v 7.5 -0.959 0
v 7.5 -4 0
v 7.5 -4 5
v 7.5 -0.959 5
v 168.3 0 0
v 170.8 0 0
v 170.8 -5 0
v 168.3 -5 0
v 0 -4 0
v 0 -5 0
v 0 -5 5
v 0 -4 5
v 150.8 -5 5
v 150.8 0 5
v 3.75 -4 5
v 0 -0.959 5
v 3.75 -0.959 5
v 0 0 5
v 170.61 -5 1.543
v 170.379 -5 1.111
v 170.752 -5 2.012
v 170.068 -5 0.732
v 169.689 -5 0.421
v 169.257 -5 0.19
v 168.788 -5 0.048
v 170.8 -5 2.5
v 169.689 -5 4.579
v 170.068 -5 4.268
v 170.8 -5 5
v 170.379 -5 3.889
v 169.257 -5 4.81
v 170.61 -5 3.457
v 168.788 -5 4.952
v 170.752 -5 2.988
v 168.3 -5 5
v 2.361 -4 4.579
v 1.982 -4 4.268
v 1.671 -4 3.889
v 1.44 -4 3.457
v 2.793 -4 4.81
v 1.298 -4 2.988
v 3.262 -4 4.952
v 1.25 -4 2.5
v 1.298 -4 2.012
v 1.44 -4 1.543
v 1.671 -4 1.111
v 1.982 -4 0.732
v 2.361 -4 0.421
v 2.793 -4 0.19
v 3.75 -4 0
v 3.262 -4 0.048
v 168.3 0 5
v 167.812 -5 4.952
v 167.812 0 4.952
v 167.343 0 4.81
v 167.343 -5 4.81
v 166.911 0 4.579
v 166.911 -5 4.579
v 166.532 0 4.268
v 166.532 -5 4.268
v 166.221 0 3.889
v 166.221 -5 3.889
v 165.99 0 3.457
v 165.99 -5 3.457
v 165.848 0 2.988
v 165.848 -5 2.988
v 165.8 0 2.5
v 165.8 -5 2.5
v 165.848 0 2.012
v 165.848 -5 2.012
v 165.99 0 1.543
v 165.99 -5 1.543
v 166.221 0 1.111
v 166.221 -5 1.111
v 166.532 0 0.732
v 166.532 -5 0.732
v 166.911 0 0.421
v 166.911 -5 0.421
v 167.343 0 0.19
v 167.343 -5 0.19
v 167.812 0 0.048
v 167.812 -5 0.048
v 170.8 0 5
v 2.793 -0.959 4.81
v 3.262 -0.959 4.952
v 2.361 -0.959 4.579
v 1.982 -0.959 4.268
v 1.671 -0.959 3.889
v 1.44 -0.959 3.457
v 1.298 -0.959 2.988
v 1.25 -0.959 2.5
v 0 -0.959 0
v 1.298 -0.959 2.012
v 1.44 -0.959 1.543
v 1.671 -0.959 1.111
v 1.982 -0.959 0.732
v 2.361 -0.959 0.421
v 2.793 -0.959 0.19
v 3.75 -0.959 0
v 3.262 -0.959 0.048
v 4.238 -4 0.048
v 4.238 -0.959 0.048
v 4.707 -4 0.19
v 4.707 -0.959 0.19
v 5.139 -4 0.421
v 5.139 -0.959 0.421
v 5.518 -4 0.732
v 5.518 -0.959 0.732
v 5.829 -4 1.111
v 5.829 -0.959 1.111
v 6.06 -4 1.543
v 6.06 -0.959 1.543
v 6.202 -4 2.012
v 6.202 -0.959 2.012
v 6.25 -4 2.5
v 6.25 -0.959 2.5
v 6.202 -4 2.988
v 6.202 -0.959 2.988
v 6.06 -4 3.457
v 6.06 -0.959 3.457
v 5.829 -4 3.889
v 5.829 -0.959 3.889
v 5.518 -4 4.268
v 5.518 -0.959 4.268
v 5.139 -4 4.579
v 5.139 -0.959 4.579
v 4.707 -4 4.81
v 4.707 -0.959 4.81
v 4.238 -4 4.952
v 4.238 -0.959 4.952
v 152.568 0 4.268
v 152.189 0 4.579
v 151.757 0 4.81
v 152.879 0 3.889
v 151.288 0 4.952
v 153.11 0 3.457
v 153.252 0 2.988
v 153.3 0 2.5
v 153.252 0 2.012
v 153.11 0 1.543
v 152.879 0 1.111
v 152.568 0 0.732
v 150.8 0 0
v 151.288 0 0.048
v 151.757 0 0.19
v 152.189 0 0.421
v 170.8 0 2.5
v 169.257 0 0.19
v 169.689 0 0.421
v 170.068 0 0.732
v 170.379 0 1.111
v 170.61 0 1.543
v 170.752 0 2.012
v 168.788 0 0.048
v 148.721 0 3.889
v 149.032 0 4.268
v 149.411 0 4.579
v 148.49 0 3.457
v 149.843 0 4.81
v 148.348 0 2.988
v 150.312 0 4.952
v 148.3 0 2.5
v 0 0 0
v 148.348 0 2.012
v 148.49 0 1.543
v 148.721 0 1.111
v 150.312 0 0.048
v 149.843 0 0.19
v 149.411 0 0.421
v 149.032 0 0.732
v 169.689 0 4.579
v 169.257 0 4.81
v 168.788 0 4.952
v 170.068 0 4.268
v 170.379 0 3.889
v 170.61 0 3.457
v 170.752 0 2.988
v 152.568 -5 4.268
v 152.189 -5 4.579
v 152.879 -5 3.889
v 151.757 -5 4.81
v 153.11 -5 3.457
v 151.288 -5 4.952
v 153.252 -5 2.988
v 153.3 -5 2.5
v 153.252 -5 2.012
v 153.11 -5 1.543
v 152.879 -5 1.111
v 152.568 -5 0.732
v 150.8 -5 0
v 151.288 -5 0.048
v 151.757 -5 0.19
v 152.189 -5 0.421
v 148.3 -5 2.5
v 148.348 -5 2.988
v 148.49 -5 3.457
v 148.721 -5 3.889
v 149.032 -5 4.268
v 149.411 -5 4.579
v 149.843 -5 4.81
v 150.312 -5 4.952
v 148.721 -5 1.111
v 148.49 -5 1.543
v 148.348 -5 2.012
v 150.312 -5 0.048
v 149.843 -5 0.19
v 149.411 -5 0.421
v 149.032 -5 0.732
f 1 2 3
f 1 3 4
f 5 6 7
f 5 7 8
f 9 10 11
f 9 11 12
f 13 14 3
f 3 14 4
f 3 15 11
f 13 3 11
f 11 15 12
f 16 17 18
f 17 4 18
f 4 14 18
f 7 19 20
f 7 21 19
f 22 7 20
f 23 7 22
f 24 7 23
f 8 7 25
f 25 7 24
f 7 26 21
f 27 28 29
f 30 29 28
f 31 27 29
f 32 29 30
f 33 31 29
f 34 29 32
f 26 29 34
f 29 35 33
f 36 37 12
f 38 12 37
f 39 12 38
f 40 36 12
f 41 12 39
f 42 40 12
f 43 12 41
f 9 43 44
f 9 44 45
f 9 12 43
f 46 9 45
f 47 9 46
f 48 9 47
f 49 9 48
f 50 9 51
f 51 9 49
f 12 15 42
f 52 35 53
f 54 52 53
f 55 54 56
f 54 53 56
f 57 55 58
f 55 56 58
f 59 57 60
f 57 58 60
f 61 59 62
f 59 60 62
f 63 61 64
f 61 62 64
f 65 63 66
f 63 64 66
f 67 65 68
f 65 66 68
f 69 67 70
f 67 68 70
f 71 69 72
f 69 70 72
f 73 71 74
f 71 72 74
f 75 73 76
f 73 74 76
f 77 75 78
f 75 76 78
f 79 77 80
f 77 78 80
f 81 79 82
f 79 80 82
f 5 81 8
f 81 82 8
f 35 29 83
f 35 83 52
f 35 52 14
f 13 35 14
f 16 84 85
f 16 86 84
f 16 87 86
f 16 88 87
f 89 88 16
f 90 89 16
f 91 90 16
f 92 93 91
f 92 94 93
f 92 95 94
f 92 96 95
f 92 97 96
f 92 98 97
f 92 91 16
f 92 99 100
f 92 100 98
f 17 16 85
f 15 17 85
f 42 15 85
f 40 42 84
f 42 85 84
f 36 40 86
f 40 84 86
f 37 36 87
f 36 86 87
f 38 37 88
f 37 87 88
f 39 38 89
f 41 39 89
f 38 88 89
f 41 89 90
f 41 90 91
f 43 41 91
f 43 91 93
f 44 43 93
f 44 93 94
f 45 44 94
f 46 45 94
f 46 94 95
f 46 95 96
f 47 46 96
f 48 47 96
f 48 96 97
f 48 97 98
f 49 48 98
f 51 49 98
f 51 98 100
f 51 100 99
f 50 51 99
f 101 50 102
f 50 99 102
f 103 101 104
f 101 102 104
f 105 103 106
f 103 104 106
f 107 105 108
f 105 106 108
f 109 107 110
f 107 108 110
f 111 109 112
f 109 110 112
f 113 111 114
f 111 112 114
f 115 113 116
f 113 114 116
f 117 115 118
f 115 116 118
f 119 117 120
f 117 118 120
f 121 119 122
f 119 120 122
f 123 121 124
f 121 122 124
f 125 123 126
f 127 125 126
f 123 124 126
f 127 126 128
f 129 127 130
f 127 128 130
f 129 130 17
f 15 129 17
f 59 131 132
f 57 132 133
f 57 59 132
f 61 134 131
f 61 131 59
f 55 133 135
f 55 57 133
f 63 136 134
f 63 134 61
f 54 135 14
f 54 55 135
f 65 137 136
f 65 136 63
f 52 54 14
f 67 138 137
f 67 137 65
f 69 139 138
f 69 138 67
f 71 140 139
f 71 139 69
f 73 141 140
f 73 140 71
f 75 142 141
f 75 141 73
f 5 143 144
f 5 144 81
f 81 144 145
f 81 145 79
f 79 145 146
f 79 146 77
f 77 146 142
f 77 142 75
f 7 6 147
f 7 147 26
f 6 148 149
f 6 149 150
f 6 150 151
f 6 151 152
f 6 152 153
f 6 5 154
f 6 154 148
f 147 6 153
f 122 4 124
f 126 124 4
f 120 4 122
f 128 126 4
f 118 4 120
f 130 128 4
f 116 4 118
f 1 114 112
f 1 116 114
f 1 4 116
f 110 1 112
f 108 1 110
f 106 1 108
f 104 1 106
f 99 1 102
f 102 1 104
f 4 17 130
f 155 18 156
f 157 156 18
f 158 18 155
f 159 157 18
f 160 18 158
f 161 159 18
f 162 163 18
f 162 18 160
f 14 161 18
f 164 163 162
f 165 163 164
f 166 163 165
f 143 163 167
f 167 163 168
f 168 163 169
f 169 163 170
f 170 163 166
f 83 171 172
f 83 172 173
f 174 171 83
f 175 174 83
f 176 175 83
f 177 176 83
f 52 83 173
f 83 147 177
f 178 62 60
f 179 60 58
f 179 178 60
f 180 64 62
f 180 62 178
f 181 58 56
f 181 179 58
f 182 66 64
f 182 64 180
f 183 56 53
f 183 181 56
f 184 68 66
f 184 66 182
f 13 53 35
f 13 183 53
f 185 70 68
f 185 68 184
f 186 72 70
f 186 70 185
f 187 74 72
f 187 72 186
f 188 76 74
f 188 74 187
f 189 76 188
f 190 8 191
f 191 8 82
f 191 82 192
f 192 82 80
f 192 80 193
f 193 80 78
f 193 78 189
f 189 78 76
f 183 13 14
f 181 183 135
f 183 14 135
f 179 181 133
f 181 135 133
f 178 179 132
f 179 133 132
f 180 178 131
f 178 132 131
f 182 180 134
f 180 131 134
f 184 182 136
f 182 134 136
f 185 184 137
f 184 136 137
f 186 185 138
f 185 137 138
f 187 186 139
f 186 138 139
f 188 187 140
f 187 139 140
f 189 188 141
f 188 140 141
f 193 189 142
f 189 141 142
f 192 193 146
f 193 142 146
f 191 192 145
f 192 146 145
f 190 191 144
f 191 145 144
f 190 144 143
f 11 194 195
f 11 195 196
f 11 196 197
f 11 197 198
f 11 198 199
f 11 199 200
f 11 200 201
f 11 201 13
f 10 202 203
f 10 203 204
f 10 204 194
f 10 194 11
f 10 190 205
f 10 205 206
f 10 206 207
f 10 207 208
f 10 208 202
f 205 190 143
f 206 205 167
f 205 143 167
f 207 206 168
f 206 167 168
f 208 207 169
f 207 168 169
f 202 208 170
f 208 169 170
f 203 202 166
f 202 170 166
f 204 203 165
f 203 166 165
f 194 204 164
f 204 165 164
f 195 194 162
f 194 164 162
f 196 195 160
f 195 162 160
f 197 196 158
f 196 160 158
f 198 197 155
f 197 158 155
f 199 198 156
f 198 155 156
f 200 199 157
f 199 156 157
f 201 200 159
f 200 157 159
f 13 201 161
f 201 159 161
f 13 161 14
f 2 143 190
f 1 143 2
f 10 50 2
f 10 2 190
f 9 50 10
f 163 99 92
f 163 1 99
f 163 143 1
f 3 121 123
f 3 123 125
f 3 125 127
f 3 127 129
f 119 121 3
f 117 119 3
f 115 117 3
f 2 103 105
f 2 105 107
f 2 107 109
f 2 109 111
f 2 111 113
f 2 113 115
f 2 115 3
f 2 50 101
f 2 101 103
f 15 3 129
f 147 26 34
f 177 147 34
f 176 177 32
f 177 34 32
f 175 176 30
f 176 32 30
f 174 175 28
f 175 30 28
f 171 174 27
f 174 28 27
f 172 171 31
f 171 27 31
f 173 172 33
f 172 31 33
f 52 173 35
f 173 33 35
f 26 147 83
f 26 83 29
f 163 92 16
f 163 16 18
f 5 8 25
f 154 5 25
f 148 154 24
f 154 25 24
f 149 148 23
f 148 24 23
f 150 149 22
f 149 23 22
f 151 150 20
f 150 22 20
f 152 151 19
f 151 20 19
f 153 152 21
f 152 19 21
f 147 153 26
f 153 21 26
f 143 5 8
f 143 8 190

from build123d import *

# Parameters (mm, degrees)
BOSS_EXTRUDE1_DEPTH = 5
SKETCH8_R           = 2.5
BOSS_EXTRUDE4_DEPTH = 3.041317676
SKETCH9_R           = 2.5
CUT_EXTRUDE1_DEPTH  = 10
SKETCH10_R          = 2.5
CUT_EXTRUDE3_DEPTH  = 10


with BuildPart() as part:
    # Sketch1 → Boss-Extrude1 (new body)
    with BuildSketch(Plane.XY):
        Polygon((0, 0), (170.8, 0), (170.8, -5), (0, -5), (0, -4), (7.5, -4), (7.5, -0.958682324), (0, -0.958682324), align=None)
    extrude(amount=BOSS_EXTRUDE1_DEPTH)

    # Sketch8 → Boss-Extrude4 (add)
    with BuildSketch(Plane.XZ.offset(0.958682324)):
        with Locations(Location((3.75, 2.5, 0), (0, 0, 90))):
            Circle(SKETCH8_R)
    extrude(amount=BOSS_EXTRUDE4_DEPTH)

    # Sketch9 → Cut-Extrude1 (cut)
    with BuildSketch(Plane.XZ.offset(5)):
        with Locations((168.3, 2.5)):
            Circle(SKETCH9_R)
    extrude(amount=-CUT_EXTRUDE1_DEPTH, mode=Mode.SUBTRACT)


with BuildPart() as cut_extrude1_piece_1:
    # of the separate pieces the step leaves, piece 1, a body of its own (cut_extrude1_pieces)
    add(part.part.solids().sort_by_distance((0, 0, 0))[0])

    # Sketch10 → Cut-Extrude3 (cut)
    with BuildSketch(Plane(origin=(0, 0, 0), x_dir=(1, 0, 0), z_dir=(0, 1, 0))):
        with Locations((150.8, -2.5)):
            Circle(SKETCH10_R)
    extrude(amount=-CUT_EXTRUDE3_DEPTH, mode=Mode.SUBTRACT)


with BuildPart() as cut_extrude1_piece_2:
    # of the separate pieces the step leaves, piece 2, a body of its own (cut_extrude1_pieces)
    add(part.part.solids().sort_by_distance((170.8, -5, 0))[0])


with BuildPart() as cut_extrude1_piece_3:
    # of the separate pieces the step leaves, piece 3, a body of its own (cut_extrude1_pieces)
    add(part.part.solids().sort_by_distance((170.8, 0, 5))[0])


with BuildPart() as cut_extrude3_piece_1:
    # of the separate pieces the step leaves, piece 1, a body of its own (cut_extrude3_pieces)
    add(cut_extrude1_piece_1.part.solids().sort_by_distance((0, 0, 0))[0])


with BuildPart() as cut_extrude3_piece_2:
    # of the separate pieces the step leaves, piece 2, a body of its own (cut_extrude3_pieces)
    add(cut_extrude1_piece_1.part.solids().sort_by_distance((168.3, -5, 0))[0])


solid = Compound([cut_extrude1_piece_2.part, cut_extrude1_piece_3.part, cut_extrude3_piece_1.part, cut_extrude3_piece_2.part])
